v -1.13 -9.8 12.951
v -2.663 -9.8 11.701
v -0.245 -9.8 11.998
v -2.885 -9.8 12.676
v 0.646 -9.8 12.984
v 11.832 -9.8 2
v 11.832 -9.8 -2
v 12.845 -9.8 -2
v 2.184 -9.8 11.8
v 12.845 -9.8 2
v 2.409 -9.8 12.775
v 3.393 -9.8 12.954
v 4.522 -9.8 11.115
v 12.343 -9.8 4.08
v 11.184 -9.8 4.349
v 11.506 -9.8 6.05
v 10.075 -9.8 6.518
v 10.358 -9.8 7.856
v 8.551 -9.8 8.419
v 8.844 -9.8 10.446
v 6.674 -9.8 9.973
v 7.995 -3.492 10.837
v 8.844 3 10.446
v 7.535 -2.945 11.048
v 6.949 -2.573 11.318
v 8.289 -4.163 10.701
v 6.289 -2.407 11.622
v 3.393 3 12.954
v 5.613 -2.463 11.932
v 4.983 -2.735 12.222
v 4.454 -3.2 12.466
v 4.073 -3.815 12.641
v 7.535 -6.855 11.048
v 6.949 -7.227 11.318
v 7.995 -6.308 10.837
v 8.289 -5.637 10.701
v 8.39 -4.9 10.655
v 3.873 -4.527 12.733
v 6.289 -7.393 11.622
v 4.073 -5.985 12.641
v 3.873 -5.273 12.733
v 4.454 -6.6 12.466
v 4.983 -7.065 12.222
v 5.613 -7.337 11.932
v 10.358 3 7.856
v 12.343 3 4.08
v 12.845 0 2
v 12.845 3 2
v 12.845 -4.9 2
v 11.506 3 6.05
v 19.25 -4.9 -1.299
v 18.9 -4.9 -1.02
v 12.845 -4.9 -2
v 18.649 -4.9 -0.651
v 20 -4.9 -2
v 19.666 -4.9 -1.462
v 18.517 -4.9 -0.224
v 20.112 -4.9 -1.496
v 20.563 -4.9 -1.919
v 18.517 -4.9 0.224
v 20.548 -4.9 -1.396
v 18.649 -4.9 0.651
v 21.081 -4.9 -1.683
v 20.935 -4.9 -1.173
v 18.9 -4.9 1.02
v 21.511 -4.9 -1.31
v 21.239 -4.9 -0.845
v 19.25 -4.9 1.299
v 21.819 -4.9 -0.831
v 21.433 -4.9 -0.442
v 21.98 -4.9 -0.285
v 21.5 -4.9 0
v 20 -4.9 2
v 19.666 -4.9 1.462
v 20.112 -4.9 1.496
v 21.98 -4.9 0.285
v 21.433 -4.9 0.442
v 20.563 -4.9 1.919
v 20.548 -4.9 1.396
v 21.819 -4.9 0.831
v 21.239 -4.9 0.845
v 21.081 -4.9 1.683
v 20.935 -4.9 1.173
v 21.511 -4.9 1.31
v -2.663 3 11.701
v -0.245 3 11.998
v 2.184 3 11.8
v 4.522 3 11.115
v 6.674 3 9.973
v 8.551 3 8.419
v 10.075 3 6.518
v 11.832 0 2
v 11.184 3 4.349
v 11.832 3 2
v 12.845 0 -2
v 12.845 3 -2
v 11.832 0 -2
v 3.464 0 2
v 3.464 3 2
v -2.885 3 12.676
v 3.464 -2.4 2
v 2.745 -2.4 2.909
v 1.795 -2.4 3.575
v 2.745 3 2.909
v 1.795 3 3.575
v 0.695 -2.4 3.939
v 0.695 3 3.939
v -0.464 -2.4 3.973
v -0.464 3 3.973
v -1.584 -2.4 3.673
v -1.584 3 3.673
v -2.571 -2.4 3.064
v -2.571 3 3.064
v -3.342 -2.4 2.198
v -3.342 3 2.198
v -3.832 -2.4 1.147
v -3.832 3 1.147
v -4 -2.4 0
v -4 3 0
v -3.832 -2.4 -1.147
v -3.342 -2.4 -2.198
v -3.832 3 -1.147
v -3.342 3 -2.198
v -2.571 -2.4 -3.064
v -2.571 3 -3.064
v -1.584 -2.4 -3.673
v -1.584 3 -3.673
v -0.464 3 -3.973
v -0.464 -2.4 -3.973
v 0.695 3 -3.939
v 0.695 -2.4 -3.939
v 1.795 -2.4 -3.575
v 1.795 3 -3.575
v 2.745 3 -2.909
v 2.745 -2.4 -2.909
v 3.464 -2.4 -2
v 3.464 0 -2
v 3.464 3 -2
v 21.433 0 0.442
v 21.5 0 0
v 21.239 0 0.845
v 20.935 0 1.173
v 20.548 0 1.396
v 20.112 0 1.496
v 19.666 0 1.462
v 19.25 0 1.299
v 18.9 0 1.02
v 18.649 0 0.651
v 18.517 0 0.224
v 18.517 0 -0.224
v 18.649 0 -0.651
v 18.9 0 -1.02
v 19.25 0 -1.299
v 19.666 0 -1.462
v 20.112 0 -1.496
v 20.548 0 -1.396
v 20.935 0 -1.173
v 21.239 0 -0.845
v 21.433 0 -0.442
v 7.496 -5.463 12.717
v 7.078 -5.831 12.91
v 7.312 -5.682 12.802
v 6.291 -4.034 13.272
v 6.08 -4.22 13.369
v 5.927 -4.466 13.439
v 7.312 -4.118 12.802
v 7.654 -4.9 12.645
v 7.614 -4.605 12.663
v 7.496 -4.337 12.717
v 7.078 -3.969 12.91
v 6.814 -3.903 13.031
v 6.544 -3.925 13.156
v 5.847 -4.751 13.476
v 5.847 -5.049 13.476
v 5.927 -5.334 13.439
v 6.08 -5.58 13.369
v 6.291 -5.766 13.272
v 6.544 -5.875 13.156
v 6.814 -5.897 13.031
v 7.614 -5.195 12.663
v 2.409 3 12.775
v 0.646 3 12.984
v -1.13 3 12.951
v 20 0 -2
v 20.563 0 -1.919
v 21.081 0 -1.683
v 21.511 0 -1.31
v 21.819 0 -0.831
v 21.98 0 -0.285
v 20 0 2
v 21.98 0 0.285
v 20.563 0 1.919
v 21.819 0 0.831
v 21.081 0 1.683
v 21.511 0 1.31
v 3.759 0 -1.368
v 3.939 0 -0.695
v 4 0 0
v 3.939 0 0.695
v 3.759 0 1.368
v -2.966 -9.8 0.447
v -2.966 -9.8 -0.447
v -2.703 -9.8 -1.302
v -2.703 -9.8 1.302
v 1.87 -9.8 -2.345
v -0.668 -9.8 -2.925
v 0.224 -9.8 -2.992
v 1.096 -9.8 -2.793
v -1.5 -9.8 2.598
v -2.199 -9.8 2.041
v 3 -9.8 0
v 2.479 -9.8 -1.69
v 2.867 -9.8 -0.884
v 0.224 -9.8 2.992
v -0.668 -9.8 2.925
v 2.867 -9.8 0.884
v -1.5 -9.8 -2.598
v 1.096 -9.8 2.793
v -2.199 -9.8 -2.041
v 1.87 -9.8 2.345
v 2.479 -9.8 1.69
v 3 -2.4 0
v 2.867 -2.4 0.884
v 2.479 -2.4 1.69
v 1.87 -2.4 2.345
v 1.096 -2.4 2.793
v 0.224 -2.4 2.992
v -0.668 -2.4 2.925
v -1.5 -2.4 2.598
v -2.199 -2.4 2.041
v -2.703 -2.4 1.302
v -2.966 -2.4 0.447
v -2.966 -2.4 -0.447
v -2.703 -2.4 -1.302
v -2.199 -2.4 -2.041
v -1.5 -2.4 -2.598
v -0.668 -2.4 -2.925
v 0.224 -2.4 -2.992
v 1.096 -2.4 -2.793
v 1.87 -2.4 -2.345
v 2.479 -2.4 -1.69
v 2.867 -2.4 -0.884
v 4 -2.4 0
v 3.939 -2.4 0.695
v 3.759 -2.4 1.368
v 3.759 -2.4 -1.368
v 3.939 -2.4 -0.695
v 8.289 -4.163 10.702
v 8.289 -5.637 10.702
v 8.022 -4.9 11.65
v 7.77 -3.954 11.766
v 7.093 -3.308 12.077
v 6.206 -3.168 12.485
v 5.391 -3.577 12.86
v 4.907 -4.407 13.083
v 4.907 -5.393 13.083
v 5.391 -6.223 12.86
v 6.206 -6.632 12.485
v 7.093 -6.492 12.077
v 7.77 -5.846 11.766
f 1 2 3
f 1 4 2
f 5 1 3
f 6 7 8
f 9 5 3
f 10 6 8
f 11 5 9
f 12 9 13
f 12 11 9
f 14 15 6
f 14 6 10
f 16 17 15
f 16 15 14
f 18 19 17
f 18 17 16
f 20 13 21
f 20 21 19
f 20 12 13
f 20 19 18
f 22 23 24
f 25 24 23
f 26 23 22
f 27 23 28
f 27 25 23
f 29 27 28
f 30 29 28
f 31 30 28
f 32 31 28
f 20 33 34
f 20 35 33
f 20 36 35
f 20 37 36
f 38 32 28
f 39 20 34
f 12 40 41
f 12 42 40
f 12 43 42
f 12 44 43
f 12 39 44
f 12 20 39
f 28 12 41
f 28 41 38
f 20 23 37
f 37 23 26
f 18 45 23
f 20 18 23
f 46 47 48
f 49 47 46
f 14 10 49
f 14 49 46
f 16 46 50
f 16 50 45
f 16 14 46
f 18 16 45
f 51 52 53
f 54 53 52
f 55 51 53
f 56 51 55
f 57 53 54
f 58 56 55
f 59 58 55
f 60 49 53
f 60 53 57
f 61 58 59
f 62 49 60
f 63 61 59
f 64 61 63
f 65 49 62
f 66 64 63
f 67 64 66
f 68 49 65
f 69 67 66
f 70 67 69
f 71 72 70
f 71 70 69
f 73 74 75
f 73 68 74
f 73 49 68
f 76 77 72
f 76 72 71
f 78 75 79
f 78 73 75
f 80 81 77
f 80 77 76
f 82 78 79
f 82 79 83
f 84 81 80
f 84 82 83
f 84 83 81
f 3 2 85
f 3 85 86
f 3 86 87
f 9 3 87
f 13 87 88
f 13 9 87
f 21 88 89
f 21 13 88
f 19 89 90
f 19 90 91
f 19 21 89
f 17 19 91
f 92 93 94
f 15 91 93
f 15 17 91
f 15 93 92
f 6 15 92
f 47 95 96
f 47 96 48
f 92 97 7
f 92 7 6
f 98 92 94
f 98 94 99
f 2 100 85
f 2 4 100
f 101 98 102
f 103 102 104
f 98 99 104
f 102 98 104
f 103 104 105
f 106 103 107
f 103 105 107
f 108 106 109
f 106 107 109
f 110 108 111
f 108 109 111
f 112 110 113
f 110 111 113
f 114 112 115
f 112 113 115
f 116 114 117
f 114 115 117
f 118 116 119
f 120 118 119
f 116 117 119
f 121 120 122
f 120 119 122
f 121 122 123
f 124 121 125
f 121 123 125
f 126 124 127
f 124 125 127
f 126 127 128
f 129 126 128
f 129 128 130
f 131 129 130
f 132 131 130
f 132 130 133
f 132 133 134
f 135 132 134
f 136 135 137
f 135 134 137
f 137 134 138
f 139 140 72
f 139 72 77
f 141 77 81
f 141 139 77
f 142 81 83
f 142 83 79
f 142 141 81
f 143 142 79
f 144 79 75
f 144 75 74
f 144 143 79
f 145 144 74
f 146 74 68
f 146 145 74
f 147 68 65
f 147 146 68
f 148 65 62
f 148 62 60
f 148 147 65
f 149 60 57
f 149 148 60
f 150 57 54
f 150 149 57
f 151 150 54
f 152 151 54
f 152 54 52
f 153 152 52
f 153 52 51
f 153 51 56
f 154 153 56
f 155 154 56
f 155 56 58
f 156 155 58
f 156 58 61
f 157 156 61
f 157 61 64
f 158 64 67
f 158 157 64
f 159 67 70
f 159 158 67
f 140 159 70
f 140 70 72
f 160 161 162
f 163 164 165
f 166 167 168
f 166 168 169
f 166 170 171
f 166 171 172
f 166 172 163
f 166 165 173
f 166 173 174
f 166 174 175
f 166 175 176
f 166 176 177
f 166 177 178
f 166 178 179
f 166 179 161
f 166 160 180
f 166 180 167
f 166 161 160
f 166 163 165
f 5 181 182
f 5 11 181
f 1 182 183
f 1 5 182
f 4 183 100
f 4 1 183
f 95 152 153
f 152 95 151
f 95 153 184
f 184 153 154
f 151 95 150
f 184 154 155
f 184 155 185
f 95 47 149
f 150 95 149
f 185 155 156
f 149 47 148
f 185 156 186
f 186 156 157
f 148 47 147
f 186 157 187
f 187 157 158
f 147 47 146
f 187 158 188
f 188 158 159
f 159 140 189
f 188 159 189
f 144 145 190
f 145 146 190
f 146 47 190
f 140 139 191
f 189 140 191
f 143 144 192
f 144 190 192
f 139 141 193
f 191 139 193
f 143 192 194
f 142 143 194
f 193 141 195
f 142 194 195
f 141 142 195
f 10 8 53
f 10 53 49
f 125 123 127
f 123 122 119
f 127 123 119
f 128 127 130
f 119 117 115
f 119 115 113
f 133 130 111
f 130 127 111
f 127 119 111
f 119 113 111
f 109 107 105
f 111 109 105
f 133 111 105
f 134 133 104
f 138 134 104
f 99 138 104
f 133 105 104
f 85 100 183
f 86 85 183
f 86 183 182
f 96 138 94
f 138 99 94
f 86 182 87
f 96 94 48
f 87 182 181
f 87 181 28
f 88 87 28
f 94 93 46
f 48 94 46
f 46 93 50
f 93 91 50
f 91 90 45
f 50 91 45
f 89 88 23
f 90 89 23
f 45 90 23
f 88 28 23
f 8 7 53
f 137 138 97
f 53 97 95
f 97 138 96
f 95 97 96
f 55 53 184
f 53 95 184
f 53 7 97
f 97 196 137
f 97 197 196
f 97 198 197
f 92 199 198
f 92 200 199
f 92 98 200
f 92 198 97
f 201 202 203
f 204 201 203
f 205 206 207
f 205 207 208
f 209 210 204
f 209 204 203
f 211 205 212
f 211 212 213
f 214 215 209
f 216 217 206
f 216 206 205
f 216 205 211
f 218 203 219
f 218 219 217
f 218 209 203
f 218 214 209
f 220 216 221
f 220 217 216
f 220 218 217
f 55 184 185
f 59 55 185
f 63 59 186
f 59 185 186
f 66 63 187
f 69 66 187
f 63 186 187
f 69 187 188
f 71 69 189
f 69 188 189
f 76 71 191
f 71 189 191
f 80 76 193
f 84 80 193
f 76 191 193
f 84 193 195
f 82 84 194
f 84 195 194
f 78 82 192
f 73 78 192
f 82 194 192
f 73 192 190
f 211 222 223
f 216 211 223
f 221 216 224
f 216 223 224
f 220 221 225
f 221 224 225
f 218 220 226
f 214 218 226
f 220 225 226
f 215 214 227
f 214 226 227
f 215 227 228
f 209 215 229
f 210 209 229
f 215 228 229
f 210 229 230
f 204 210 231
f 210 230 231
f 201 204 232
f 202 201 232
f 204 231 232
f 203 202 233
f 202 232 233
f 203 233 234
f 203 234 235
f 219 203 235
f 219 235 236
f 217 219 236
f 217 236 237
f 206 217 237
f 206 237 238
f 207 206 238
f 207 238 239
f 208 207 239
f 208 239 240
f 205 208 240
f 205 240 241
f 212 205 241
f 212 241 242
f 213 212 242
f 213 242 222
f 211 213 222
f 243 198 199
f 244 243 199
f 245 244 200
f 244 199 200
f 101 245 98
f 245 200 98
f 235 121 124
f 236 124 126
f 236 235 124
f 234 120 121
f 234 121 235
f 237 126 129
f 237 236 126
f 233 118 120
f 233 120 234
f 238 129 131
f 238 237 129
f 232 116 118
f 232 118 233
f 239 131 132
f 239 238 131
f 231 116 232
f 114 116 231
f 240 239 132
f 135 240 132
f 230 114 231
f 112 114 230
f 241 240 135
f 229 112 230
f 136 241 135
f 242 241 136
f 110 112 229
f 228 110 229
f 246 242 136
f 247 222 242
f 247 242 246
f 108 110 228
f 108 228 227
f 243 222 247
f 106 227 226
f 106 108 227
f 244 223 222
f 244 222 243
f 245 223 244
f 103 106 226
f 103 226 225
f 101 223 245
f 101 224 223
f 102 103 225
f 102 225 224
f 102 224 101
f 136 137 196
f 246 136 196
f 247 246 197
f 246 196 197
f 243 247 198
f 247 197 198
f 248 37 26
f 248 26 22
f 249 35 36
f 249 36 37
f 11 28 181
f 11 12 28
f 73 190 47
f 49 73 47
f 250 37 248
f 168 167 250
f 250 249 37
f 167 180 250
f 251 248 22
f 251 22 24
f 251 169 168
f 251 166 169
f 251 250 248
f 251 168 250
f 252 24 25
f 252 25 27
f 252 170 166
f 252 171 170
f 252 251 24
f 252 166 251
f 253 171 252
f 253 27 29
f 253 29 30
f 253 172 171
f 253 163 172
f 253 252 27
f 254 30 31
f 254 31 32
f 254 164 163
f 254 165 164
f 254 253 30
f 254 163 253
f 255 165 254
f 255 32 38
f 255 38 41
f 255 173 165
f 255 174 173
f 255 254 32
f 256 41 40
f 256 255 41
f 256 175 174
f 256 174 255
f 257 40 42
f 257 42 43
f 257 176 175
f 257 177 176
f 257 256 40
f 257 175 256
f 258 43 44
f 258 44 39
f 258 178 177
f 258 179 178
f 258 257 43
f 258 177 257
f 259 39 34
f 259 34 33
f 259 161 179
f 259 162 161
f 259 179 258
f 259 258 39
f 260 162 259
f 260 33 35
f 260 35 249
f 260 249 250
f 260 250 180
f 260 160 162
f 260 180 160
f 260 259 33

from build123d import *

# Parameters (mm, degrees)
F0_W      = 1.0130730125
F0_H      = 4
F1_DEPTH  = 9.8
F0_R      = 3
F2_DEPTH  = 3
F0_W_2    = 2
F0_R_2    = 1.5
F3_DEPTH  = 4.9
F4_R      = 3
F5_DEPTH  = 9.8
F6_DEPTH  = 2.4
F7_R      = 2.5
F8_DEPTH  = 1.5
F9_SIZE   = 1.49999
F10_DEPTH = 3


# Not quite as in the source:
# - a fillet or chamfer is up to 0.001 mm smaller than in the source, because OpenCascade refuses the exact size
# - a feature names something its author has since deleted; it is built from what else it names


with BuildPart() as f1:
    # F0 (on Front) → F1 (new body)
    with BuildSketch(Plane.XZ):
        with BuildLine():
            ThreePointArc((-2.6630696544, 11.7007717701), (6.6741513084, 9.9727480823), (11.8321595662, 2))
            Line((11.8321595662, 2), (12.8452325787, 2))
            ThreePointArc((12.8452325787, 2), (11.9653059951, 5.0824651934), (10.3578419044, 7.8558965804))
            ThreePointArc((10.3578419044, 7.8558965804), (6.8410523386, 11.0544110156), (2.4094924969, 12.7747542406))
            ThreePointArc((2.4094924969, 12.7747542406), (-0.2428398127, 12.99773168), (-2.8849921256, 12.6758360843))
            Line((-2.8849921256, 12.6758360843), (-2.6630696544, 11.7007717701))
        make_face()
        with Locations((12.3386960724, 0)):
            Rectangle(F0_W, F0_H)
        with BuildLine():
            ThreePointArc((2.4094924969, 12.7747542406), (6.8410523386, 11.0544110156), (10.3578419044, 7.8558965804))
            Line((10.3578419044, 7.8558965804), (8.8443472742, 10.4461347942))
            Line((8.8443472742, 10.4461347942), (3.3933836255, 12.9535229374))
            Line((3.3933836255, 12.9535229374), (2.4094924969, 12.7747542406))
        make_face()
    extrude(amount=F1_DEPTH)

    # F0 (on Front) → F2 (join)
    with BuildSketch(Plane.XZ):
        with Locations((12.3386960724, 0)):
            Rectangle(F0_W, F0_H)
        with BuildLine():
            Line((11.8321595662, 2), (3.4641016151, 2))
            ThreePointArc((3.4641016151, 2), (3.8637033052, 1.0352761804), (4, 0))
            ThreePointArc((4, 0), (3.8637033052, -1.0352761804), (3.4641016151, -2))
            Line((3.4641016151, -2), (11.8321595662, -2))
            Line((11.8321595662, -2), (11.8321595662, 2))
        make_face()
        with BuildLine():
            ThreePointArc((4, 0), (3.8637033052, 1.0352761804), (3.4641016151, 2))
            ThreePointArc((3.4641016151, 2), (-4, 0), (3.4641016151, -2))
            ThreePointArc((3.4641016151, -2), (3.8637033052, -1.0352761804), (4, 0))
        make_face()
        Circle(F0_R, mode=Mode.SUBTRACT)
        Circle(F0_R)
    extrude(amount=-F2_DEPTH)

    # F0 (on Front) → F3 (join)
    with BuildSketch(Plane.XZ):
        with Locations((13.8452325787, 0)):
            Rectangle(F0_W_2, F0_H)
        with BuildLine():
            Line((20, 2), (14.8452325787, 2))
            Line((14.8452325787, 2), (14.8452325787, -2))
            Line((14.8452325787, -2), (20, -2))
            ThreePointArc((20, -2), (22, 0), (20, 2))
        make_face()
        with Locations((20, 0)):
            Circle(F0_R_2, mode=Mode.SUBTRACT)
    extrude(amount=F3_DEPTH)

    # F4 (on face) → F5 (join)
    with BuildSketch(Plane.XZ):
        Circle(F4_R)
    extrude(amount=F5_DEPTH)

    # F4 (on face) → F6 (join)
    with BuildSketch(Plane.XZ):
        with BuildLine():
            ThreePointArc((3.4641016151, -2), (3.8637033052, -1.0352761804), (4, 0))
            ThreePointArc((4, 0), (3.8637033052, 1.0352761804), (3.4641016151, 2))
            ThreePointArc((3.4641016151, 2), (-4, 0), (3.4641016151, -2))
        make_face()
        Circle(F4_R, mode=Mode.SUBTRACT)
    extrude(amount=F6_DEPTH)

    # F7 (on face) → F8 (join)
    with BuildSketch(Plane(origin=(5.5105226193, 0, 11.9796604147), x_dir=(0.9084939414, 0, -0.4178980239), z_dir=(0.4178980239, 0, 0.9084939414))):
        with Locations((0.6696168272, -4.9)):
            Circle(F7_R)
    extrude(amount=F8_DEPTH)

    # F9 (size 1.5 in the source; OpenCascade refuses exactly that, so slightly less here)
    f9_edges = [f1.edges().sort_by_distance(p)[0] for p in [
        (4.474478, -4.9, 14.107315),
    ]]
    chamfer(f9_edges, length=F9_SIZE)

    # F10 (add): a face of the model
    f10_faces = [f1.faces().sort_by_distance(p)[0] for p in [
        (-0.2392542287, 0, 12.8058172707),
    ]]
    extrude(f10_faces, amount=F10_DEPTH)


solid = f1.part
